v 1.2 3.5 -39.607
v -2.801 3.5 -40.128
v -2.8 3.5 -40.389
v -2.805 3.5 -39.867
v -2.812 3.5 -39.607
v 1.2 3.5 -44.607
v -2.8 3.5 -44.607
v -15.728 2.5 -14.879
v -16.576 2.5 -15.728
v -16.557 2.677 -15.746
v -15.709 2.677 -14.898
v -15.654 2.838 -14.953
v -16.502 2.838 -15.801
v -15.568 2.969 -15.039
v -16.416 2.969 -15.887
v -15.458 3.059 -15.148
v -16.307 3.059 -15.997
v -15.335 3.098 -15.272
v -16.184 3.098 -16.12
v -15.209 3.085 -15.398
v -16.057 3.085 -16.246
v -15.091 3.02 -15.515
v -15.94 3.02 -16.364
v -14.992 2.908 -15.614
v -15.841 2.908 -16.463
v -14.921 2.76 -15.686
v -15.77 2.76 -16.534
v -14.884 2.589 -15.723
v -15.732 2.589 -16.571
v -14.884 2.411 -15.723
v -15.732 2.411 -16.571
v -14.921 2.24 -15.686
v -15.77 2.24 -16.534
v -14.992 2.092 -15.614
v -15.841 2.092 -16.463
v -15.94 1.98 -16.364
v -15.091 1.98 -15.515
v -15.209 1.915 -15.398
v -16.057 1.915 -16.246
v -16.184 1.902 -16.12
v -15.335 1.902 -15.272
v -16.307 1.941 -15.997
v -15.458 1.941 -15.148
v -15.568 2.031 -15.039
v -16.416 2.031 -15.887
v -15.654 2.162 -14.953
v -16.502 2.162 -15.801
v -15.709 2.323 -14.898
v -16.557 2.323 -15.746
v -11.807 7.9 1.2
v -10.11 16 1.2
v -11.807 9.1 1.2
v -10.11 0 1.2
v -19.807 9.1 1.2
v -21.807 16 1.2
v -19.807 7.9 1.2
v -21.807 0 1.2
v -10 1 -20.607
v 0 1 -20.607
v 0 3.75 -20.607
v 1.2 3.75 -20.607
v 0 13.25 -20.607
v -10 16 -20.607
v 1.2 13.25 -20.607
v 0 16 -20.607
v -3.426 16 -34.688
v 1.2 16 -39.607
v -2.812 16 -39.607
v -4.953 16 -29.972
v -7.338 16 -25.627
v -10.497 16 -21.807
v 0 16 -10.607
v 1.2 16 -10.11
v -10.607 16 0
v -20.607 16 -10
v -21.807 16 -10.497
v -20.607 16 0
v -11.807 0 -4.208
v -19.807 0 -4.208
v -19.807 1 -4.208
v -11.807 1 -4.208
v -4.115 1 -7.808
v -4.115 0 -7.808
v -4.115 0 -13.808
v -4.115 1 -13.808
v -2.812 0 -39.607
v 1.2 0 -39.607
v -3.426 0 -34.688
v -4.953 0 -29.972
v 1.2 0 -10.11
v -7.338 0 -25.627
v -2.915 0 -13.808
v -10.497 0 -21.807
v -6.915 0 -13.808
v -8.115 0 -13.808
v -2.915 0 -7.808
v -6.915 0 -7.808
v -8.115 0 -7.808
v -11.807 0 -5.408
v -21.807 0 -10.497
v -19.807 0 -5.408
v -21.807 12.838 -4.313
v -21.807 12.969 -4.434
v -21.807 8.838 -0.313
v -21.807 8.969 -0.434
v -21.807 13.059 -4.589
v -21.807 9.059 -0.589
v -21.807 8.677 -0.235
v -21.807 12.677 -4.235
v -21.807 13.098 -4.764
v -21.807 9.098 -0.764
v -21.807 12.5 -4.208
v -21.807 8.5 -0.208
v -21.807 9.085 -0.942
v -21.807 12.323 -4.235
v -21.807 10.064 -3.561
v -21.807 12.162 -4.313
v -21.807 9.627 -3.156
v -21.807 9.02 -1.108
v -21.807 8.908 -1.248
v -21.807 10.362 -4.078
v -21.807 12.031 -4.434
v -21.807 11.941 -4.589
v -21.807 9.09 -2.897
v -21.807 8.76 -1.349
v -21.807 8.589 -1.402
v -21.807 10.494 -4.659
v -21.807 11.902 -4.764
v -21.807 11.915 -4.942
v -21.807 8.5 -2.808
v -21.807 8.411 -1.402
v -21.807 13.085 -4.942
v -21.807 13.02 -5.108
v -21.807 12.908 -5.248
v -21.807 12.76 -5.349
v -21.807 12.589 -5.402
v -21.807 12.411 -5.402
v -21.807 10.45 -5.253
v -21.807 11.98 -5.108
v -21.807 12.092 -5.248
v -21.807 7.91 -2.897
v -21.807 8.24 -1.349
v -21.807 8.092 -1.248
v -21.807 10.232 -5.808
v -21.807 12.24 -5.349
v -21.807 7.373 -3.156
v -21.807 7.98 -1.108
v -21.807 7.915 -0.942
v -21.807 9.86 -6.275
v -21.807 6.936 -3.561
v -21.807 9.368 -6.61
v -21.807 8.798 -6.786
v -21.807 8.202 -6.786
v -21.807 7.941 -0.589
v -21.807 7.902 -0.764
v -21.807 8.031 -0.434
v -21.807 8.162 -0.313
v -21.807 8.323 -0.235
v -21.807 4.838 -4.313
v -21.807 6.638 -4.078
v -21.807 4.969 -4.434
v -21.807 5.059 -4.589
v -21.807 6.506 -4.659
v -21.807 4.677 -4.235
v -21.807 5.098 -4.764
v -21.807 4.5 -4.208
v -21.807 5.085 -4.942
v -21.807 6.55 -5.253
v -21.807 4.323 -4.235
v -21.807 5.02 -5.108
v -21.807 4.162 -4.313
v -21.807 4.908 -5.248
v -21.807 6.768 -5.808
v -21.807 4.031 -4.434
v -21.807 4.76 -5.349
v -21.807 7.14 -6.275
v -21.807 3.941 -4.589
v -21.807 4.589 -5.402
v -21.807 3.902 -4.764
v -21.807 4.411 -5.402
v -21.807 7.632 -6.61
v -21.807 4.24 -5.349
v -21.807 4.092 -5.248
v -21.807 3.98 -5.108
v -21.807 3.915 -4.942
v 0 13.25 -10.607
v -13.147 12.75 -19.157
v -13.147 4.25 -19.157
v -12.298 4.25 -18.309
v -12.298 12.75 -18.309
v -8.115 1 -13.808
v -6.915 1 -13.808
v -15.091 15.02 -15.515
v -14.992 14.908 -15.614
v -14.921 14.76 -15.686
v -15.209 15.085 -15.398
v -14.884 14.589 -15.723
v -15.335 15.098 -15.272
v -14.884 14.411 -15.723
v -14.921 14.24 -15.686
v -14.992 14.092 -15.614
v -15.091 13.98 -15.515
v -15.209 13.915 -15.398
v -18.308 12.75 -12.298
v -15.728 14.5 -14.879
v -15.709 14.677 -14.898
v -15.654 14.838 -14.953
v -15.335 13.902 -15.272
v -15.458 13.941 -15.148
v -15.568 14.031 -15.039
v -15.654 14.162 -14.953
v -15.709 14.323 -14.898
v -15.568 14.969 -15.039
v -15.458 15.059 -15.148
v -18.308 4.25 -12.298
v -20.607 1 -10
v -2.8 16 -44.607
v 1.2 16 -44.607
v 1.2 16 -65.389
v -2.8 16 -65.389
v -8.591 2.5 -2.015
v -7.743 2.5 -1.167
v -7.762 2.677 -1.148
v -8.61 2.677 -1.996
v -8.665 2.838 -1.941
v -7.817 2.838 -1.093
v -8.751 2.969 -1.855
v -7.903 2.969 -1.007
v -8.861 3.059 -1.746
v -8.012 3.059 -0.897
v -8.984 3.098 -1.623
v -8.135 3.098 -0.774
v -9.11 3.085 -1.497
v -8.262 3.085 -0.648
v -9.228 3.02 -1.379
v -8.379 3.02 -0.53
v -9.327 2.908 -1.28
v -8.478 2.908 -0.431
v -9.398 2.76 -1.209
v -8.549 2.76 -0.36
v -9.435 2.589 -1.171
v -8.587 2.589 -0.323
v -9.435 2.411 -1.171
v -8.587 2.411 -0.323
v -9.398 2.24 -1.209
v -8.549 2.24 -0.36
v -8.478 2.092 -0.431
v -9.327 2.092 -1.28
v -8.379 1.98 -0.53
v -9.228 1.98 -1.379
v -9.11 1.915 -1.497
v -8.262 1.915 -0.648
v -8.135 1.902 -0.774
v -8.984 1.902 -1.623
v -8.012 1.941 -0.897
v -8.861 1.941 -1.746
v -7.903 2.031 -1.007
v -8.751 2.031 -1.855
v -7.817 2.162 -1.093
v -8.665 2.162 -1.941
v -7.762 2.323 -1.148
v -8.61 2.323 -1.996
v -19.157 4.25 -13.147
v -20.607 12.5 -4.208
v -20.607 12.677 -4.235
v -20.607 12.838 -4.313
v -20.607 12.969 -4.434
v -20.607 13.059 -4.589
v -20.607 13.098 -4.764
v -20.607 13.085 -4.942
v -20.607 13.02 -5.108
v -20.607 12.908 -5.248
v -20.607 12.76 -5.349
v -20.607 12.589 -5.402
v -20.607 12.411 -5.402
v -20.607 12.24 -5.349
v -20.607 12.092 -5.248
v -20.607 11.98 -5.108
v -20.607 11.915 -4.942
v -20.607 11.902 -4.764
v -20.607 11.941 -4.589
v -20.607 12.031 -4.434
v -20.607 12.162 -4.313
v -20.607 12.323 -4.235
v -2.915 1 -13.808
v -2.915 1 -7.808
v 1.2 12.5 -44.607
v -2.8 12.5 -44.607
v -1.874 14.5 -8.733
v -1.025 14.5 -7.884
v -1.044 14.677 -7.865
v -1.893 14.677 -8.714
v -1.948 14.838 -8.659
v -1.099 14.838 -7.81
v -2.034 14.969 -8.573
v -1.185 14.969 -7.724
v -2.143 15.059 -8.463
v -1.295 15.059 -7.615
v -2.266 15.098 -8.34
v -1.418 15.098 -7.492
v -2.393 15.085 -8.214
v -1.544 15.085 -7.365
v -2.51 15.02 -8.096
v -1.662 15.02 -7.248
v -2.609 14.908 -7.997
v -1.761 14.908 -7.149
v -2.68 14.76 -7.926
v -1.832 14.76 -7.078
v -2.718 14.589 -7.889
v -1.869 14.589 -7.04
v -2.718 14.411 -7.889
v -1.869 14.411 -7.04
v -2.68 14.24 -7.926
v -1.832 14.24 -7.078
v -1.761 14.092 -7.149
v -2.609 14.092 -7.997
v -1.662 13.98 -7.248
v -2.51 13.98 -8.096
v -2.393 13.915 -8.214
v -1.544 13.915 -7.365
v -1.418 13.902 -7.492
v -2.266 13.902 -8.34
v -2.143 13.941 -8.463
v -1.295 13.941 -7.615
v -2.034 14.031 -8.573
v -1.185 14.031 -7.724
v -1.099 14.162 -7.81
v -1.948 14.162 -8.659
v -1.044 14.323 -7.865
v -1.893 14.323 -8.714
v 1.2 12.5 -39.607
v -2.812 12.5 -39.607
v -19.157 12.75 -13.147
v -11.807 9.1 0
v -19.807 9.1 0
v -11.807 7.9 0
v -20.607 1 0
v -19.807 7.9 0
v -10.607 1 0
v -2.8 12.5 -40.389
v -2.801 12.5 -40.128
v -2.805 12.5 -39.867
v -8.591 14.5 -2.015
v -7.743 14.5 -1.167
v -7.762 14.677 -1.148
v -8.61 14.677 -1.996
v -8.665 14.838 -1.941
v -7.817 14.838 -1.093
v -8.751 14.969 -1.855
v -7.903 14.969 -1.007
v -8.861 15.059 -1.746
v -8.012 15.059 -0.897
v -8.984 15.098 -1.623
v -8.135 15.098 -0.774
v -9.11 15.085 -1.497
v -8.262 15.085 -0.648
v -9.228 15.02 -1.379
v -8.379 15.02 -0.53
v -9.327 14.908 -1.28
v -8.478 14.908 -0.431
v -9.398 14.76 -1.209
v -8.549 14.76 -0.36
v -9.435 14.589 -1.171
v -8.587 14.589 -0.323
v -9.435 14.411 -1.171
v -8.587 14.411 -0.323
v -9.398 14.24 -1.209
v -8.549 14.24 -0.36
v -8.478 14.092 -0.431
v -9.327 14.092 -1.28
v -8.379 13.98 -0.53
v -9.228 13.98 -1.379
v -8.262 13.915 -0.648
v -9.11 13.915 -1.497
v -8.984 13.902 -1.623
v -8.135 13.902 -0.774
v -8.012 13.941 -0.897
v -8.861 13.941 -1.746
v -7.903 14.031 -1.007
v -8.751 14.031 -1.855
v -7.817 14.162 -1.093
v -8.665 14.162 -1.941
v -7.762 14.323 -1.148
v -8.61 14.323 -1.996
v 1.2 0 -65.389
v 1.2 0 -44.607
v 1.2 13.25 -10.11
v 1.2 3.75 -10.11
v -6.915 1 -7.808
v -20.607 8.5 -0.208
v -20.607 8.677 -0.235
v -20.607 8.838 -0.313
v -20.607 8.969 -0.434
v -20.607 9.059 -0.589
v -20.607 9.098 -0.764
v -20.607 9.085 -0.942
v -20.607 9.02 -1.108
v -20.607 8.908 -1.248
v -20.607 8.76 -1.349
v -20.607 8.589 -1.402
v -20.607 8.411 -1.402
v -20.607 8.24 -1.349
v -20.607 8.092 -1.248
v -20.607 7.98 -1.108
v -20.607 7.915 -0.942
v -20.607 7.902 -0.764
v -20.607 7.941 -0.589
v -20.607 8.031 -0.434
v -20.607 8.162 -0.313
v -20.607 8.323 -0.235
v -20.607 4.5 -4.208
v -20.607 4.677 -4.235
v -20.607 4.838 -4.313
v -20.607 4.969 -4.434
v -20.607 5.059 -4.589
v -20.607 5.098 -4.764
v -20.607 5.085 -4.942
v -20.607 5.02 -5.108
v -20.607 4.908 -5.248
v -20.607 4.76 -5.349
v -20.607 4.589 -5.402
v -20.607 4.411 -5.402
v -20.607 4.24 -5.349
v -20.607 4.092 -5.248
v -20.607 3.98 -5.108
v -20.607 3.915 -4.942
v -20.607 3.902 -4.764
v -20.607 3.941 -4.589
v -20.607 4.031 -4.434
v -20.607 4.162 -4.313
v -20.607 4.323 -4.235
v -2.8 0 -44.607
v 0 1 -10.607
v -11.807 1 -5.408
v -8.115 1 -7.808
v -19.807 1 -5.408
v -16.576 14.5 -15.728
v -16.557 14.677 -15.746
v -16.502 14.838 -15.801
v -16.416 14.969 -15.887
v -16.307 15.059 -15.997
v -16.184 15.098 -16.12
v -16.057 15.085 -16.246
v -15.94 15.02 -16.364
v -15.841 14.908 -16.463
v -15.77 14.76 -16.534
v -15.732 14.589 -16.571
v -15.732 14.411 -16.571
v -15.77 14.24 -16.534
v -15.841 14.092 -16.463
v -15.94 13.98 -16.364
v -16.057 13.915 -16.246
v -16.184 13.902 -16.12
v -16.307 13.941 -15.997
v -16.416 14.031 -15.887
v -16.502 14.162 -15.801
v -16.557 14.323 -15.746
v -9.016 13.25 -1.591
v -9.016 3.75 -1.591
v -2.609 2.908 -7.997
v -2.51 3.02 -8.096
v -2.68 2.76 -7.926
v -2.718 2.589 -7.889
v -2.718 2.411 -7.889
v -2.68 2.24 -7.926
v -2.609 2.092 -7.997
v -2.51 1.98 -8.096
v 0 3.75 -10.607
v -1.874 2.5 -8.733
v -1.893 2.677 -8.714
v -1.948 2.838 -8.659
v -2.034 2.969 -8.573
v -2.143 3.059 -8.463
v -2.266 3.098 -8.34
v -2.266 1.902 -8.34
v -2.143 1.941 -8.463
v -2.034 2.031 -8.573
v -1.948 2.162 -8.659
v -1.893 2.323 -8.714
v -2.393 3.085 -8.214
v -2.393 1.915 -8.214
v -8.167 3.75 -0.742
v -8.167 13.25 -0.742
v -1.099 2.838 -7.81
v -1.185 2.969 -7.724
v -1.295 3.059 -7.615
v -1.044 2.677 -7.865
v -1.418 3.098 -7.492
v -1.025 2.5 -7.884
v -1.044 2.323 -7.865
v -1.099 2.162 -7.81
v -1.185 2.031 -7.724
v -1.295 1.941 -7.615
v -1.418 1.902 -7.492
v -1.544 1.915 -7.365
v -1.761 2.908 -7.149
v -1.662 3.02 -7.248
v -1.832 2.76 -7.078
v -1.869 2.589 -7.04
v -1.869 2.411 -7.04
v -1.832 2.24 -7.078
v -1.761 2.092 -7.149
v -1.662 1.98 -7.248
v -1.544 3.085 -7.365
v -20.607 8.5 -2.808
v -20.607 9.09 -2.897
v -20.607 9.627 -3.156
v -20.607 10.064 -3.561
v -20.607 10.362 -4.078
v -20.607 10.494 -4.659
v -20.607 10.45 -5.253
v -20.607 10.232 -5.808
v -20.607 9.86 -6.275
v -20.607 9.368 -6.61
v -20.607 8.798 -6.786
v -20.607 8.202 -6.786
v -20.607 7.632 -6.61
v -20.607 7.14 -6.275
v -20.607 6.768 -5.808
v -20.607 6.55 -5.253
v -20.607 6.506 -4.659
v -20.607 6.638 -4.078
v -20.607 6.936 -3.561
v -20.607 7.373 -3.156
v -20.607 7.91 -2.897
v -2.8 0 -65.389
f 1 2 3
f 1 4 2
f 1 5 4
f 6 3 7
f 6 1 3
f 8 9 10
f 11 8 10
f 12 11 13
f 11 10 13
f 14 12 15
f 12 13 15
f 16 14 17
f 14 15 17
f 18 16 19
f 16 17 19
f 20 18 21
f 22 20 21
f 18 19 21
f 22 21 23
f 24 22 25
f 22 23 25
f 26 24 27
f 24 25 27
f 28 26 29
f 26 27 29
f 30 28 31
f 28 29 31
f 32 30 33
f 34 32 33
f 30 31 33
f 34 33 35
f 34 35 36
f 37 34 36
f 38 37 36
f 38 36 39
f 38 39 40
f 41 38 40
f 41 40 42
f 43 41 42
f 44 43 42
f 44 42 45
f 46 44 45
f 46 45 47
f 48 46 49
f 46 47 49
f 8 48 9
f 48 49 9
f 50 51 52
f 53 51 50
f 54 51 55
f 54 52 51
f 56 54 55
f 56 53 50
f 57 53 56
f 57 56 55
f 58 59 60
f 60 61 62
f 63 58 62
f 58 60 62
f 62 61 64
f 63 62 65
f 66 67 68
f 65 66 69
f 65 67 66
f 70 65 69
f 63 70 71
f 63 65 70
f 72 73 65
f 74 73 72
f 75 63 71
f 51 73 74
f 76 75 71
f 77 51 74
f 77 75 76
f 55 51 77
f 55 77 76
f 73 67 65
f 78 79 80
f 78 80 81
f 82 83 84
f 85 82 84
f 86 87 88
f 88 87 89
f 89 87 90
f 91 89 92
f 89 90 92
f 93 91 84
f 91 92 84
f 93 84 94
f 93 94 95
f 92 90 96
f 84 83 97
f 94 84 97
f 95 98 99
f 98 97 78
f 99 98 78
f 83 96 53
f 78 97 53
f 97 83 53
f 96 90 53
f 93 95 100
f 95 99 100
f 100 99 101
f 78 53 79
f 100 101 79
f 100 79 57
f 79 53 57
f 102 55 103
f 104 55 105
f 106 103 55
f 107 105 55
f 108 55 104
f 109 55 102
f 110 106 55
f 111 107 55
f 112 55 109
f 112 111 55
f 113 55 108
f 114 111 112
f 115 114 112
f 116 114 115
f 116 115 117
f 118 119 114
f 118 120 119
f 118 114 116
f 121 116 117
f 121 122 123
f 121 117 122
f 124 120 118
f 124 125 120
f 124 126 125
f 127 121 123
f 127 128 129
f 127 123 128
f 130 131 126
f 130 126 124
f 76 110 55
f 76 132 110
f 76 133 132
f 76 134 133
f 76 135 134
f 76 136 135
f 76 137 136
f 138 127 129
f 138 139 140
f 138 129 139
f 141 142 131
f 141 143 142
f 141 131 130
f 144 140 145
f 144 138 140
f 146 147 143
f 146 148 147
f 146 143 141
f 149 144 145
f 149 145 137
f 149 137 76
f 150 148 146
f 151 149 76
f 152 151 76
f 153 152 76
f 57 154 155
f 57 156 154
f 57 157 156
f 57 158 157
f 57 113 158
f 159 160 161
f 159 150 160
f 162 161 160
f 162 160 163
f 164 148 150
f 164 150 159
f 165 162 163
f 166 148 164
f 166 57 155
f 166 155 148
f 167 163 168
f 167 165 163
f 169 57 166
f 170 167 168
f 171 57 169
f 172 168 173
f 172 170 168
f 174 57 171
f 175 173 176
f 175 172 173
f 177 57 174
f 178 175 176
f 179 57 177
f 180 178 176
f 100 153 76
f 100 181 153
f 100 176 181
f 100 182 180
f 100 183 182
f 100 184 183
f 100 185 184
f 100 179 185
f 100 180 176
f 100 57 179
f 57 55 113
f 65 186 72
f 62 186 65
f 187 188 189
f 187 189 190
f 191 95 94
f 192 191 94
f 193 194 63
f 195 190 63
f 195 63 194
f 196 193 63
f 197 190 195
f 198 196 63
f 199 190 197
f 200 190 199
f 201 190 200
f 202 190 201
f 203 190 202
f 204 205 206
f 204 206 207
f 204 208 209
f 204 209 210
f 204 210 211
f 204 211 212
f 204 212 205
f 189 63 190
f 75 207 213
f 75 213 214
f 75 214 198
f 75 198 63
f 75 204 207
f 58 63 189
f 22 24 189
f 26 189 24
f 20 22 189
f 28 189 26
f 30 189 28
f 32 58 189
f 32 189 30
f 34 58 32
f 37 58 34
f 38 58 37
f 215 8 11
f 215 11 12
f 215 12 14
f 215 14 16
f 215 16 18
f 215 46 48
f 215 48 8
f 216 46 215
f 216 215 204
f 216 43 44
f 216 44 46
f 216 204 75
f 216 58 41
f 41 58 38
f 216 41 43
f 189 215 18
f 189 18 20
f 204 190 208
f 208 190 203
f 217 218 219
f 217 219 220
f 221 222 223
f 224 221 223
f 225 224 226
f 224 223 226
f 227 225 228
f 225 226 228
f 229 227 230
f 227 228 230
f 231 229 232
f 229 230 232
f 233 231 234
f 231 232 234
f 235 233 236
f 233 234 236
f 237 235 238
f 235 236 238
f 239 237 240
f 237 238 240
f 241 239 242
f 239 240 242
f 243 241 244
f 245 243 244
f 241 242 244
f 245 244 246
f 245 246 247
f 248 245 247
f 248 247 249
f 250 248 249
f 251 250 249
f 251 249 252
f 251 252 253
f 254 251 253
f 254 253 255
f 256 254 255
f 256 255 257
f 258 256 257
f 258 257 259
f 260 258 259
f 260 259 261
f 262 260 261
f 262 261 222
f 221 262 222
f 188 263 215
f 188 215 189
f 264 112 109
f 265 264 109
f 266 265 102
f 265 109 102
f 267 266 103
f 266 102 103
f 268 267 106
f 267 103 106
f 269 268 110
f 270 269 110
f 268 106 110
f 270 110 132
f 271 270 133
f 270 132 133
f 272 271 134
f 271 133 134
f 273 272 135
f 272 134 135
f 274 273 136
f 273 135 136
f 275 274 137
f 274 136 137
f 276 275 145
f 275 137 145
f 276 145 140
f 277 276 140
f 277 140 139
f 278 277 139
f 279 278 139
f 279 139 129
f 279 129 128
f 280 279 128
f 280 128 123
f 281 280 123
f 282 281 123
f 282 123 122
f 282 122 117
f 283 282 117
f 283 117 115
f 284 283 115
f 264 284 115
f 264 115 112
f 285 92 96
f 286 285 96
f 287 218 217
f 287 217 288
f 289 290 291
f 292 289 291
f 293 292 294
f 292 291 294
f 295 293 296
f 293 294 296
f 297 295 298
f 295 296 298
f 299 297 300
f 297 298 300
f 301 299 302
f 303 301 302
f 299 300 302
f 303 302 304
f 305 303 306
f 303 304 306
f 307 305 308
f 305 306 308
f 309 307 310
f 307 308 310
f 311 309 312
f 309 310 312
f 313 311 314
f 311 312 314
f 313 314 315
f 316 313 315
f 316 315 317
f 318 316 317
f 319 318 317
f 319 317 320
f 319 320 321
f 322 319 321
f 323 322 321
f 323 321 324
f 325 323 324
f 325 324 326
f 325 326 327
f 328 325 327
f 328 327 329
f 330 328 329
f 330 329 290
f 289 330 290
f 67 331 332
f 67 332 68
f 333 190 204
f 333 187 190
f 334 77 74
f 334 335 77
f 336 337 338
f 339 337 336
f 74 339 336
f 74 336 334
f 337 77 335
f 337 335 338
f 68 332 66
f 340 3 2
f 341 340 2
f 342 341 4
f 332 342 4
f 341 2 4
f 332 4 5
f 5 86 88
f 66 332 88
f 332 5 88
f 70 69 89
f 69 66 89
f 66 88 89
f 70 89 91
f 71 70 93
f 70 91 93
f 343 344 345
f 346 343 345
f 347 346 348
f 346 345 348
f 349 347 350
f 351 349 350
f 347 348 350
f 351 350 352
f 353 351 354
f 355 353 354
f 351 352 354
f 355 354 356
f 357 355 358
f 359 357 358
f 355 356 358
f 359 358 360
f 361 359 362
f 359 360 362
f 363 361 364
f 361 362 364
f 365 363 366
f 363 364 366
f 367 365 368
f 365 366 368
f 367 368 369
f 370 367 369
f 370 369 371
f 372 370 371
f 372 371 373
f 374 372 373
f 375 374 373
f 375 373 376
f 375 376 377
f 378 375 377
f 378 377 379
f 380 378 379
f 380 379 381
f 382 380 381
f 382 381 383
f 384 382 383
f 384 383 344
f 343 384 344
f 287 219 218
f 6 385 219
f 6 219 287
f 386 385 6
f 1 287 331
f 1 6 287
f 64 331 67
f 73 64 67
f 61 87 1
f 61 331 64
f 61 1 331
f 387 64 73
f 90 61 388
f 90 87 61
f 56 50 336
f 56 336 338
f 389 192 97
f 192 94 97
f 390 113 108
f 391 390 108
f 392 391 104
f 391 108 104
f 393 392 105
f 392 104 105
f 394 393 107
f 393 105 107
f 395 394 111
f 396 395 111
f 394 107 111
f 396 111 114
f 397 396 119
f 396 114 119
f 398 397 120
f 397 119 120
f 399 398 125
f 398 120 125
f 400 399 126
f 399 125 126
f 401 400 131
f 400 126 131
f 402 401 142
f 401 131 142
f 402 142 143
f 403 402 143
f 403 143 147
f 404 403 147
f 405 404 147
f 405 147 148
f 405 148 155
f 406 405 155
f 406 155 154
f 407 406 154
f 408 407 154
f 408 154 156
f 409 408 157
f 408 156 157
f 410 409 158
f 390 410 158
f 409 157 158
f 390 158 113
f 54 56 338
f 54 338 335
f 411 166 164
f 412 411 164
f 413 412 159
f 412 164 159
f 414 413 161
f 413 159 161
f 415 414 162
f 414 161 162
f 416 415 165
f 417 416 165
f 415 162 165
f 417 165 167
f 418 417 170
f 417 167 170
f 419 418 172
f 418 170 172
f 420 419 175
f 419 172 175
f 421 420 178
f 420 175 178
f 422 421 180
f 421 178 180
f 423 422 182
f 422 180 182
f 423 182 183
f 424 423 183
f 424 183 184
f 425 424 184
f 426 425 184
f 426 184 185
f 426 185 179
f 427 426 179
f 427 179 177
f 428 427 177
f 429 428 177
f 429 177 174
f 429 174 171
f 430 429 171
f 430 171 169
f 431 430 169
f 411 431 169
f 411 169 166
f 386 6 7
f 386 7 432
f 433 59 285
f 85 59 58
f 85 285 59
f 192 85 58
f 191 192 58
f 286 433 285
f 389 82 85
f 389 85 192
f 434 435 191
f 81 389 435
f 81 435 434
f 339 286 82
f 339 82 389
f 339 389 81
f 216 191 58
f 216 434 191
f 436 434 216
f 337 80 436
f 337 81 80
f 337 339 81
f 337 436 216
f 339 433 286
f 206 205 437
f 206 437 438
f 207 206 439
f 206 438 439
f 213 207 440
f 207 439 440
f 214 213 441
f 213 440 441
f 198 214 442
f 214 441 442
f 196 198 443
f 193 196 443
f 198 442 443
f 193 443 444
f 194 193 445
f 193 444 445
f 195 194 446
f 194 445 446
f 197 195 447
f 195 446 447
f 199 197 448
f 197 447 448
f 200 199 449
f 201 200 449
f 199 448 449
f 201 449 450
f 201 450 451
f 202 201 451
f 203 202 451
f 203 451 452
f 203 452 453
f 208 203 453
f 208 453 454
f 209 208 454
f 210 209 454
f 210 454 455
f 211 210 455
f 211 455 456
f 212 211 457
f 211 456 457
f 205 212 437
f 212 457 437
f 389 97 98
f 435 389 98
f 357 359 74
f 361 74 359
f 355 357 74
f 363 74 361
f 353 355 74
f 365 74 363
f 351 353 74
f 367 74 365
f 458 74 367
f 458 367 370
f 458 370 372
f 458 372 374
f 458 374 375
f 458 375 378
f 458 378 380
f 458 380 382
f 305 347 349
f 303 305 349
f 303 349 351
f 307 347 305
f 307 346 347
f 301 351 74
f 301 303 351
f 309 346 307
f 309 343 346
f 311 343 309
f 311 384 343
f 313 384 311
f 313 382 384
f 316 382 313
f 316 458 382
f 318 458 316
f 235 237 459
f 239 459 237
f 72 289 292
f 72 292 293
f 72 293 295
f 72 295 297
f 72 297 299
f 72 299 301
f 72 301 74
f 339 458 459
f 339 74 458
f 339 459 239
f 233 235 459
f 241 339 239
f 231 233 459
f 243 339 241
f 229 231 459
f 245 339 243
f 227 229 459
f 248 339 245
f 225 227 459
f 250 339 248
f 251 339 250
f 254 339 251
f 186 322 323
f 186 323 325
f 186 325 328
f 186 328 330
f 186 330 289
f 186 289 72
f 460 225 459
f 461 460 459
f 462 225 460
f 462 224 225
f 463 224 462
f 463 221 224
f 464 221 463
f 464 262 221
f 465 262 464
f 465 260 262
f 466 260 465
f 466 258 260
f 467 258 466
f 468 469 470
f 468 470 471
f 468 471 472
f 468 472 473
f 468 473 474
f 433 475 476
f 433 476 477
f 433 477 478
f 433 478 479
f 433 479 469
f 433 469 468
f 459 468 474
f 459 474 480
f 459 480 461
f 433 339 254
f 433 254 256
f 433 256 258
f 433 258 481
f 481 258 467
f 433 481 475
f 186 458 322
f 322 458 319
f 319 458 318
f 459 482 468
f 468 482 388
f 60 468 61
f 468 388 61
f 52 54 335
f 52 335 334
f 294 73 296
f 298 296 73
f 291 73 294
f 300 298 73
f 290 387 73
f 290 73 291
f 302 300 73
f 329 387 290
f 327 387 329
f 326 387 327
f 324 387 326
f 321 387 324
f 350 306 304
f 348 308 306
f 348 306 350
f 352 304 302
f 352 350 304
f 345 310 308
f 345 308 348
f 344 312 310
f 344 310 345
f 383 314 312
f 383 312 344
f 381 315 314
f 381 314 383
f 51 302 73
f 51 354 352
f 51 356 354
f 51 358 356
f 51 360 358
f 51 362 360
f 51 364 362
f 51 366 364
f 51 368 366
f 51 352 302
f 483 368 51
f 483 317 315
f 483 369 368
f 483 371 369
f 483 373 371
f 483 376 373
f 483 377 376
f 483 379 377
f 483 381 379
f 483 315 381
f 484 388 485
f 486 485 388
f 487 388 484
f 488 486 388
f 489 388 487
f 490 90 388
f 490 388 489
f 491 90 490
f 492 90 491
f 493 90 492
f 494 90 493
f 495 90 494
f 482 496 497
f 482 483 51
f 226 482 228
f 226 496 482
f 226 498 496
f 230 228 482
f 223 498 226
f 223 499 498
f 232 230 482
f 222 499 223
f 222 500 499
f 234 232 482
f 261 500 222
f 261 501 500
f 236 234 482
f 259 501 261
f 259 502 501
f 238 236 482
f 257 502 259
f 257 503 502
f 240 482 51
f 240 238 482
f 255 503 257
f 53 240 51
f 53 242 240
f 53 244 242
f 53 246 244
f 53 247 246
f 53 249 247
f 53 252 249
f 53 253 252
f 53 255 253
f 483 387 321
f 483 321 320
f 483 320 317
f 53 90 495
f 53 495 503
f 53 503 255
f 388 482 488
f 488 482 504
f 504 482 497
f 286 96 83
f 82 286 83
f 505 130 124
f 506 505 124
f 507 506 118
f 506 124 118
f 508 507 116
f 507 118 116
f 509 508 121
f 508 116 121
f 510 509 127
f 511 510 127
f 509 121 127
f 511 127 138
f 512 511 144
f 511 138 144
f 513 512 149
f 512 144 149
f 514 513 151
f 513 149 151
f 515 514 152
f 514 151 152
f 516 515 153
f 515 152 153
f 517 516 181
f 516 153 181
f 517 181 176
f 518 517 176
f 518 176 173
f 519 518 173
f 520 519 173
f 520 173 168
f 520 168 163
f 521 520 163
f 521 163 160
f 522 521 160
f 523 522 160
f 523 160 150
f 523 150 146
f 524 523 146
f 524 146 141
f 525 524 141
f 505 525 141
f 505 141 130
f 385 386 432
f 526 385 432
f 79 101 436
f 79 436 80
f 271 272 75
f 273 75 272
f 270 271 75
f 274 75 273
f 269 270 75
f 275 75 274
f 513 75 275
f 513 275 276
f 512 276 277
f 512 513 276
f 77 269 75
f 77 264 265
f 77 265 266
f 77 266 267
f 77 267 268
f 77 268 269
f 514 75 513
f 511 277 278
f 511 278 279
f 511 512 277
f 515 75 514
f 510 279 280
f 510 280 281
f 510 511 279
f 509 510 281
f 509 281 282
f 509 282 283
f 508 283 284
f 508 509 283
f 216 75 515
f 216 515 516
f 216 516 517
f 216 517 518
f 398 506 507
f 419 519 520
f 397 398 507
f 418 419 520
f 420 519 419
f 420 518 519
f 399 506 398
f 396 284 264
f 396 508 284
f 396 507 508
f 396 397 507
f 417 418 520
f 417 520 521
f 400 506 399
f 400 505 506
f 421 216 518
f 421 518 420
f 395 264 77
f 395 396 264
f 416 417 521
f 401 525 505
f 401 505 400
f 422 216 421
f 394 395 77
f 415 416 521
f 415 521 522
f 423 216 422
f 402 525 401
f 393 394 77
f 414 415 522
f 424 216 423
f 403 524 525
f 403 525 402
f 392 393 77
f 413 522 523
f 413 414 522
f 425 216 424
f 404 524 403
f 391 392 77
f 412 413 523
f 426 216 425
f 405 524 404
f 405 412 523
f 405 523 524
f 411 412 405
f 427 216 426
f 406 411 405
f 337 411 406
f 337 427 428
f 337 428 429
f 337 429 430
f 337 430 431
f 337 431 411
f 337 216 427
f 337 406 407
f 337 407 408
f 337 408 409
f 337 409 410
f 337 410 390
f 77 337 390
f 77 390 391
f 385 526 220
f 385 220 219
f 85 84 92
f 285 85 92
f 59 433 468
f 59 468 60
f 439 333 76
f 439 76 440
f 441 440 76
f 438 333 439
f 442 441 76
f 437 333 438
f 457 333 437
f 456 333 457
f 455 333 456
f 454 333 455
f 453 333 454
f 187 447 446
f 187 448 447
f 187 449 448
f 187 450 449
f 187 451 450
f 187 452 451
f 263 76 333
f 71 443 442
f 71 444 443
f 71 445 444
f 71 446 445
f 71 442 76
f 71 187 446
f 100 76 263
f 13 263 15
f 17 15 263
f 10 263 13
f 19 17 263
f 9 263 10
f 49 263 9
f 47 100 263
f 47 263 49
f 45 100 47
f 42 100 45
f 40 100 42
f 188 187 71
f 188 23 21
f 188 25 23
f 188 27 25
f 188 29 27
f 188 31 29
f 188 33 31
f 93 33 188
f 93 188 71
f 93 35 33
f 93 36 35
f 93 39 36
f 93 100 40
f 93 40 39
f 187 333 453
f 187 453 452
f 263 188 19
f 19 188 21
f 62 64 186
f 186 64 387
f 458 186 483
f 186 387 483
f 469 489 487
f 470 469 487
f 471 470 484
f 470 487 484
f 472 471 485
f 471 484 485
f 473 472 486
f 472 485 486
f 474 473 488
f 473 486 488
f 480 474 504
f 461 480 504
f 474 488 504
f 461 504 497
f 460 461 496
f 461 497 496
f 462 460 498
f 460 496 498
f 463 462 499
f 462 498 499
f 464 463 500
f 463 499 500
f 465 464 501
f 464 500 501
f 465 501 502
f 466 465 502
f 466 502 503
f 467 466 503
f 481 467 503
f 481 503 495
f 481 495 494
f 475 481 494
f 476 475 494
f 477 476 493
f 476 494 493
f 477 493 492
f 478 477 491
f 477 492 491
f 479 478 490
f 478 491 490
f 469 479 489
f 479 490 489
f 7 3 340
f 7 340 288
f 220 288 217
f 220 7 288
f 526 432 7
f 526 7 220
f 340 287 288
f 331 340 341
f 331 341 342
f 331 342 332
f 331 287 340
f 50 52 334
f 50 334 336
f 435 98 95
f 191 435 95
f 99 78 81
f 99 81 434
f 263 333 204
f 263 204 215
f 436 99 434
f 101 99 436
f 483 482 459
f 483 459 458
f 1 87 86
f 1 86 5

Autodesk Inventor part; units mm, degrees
ref_plane "YZ Plane" through (0, 0, 0) normal (1, 0, 0) x (0, 1, 0)
ref_plane "XZ Plane" through (0, 0, 0) normal (0, 1, 0) x (-1, 0, 0)
ref_plane "XY Plane" through (0, 0, 0) normal (0, 0, 1) x (1, 0, 0)
sketch "Sketch1" plane through (0, 0, 0) normal (0, 1, 0) x (-1, 0, 0)
  line L0 (10.6066, 0) -> (0, -10.6066)
  line L1 (0, -10.6066) -> (0, -20.6066)
  line L2 (0, -20.6066) -> (10, -20.6066)
  line L3 (10, -20.6066) -> (20.6066, -10)
  line L4 (20.6066, -10) -> (20.6066, 0)
  line L5 (20.6066, 0) -> (10.6066, 0)
  line L6 (21.8066, 1.2) -> (21.8066, -10.4971)
  line L7 (21.8066, -10.4971) -> (10.4971, -21.8066)
  line L8 (10.4971, -21.8066) -> (-1.2, -21.8066)
  line L9 (-1.2, -21.8066) -> (-1.2, -10.1095)
  line L10 (-1.2, -10.1095) -> (10.1095, 1.2)
  line L11 (10.1095, 1.2) -> (21.8066, 1.2)
  line L12 (-1.2, -21.8066) -> (-1.2, -40.3889)
  line L13 (-1.2, -40.3889) -> (2.8, -40.3889)
  arc A0 (10.4971, -21.8066) -> (2.8, -40.3889) centre (29.0794, -40.3889) ccw
  line L14 (4.8083, -4.1012) -> (5.5154, -4.8083) construction
  line L15 (5.5154, -4.8083) -> (13.9559, -4.8083) construction
  line L16 (5.5154, -4.8083) -> (5.5154, -15.0259) construction
  line L17 (-1.2, -40.3889) -> (2.8, -40.3889)
  line L18 (2.8, -40.3889) -> (2.8, -65.3889)
  line L19 (2.8, -65.3889) -> (-1.2, -65.3889)
  line L20 (-1.2, -65.3889) -> (-1.2, -40.3889)
  point P0 (0, 0)
  point P1 (4.4548, -4.4548)
  dimension "d0" = 135
  dimension "d2" = 15
  dimension "d3" = 10
  dimension "d4" = 10
  dimension "d5" = 10
  dimension "d6" = 1.2
  dimension "d29" = 4
  dimension "d44" = 1
  dimension "d45" = 0.5
  dimension "d52" = 25
extrude "Extrusion1" add sketch "Sketch1" along normal blind 1 contours L5 L4 L3 L2 L1 L0
extrude "Extrusion2" add sketch "Sketch1" along normal blind 16
sketch "Sketch2" plane through (1.2, 0, -10.1095) normal (0.7071, 0, 0.7071) x (0.7071, 0, -0.7071)
  line L0 (-15.9941, 0) -> (0, 0) projected
  line L1 (0, 0) -> (0, 16) projected
  line L2 (-15.9941, 16) -> (0, 16) projected
  line L3 (-15.9941, 0) -> (-15.9941, 16) projected
  line L4 (-13.2471, 13.25) -> (-3.7471, 13.25)
  line L5 (-3.7471, 13.25) -> (-3.7471, 3.75)
  line L6 (-3.7471, 3.75) -> (-13.2471, 3.75)
  line L7 (-13.2471, 3.75) -> (-13.2471, 13.25)
  circle A0 centre (-13.2471, 14.5) radius 0.6
  circle A1 centre (-3.7471, 14.5) radius 0.6
  circle A2 centre (-3.7471, 2.5) radius 0.6
  circle A3 centre (-13.2471, 2.5) radius 0.6
  point P0 (-7.9971, 0)
  point P1 (-8.4971, 13.25)
  point P2 (-7.9971, 16)
  point P3 (-13.2471, 8.5)
  point P4 (-15.9941, 8)
  point P5 (-8.4971, 0)
  point P6 (-8.4971, 0)
  point P7 (-8.4971, 0)
  dimension "d11" = 0.5
  dimension "d12" = 9.5
  dimension "d13" = 6
  dimension "d14" = 6
  dimension "d15" = 1.2
extrude "Extrusion3" cut sketch "Sketch2" against normal blind 2 contours L4 L5 L6 L7 | A0 | A1 | A2 | A3
sketch "Sketch3" plane through (1.2, 0, -10.1095) normal (1, 0, 0) x (0, 0, -1)
  line L0 (-9.3671, 13.25) -> (-2.6496, 13.25) projected
  line L1 (-2.6496, 3.75) -> (-9.3671, 3.75) projected
  line L2 (-2.6496, 3.75) -> (10.4971, 3.75)
  line L3 (10.4971, 3.75) -> (10.4971, 13.25)
  line L4 (10.4971, 13.25) -> (-2.6496, 13.25)
  line L5 (-2.6496, 13.25) -> (-2.6496, 3.75)
  line L6 (10.4971, 1) -> (10.4971, 16) projected
  line L7 (0, 16) -> (55.2794, 16) projected
  line L8 (55.2794, 0) -> (55.2794, 16) projected
  line L9 (0, 0) -> (55.2794, 0) projected
  line L10 (34.4971, 0) -> (29.4971, 0)
  line L11 (29.4971, 0) -> (29.4971, 3.5)
  line L12 (29.4971, 3.5) -> (34.4971, 3.5)
  line L13 (34.4971, 3.5) -> (34.4971, 0)
  line L14 (29.4971, 16) -> (34.4971, 16)
  line L15 (34.4971, 16) -> (34.4971, 12.5)
  line L16 (34.4971, 12.5) -> (29.4971, 12.5)
  line L17 (29.4971, 12.5) -> (29.4971, 16)
  point P0 (-10.1095, 0)
  point P1 (55.2794, 8)
  dimension "d59" = 5
  dimension "d60" = 9
  dimension "d66" = 20.7823
extrude "Extrusion4" cut sketch "Sketch3" against normal up to next
sketch "Sketch4" plane through (-21.8066, 0, -10.4971) normal (-0.7071, 0, -0.7071) x (-0.7071, 0, 0.7071)
  line L0 (-15.9941, 0) -> (0, 0) projected
  line L1 (0, 0) -> (0, 16) projected
  line L2 (-15.9941, 16) -> (0, 16) projected
  line L3 (-15.9941, 0) -> (-15.9941, 16) projected
  line L4 (-12.2471, 12.75) -> (-3.7471, 12.75)
  line L5 (-3.7471, 12.75) -> (-3.7471, 4.25)
  line L6 (-3.7471, 4.25) -> (-12.2471, 4.25)
  line L7 (-12.2471, 4.25) -> (-12.2471, 12.75)
  circle A0 centre (-7.9971, 14.5) radius 0.6
  circle A1 centre (-7.9971, 2.5) radius 0.6
  point P0 (-7.9971, 0)
  point P1 (-7.9971, 12.75)
  point P2 (-7.9971, 16)
  point P3 (0, 8)
  point P4 (-3.7471, 8.5)
  point P5 (-12.2471, 8.5)
  dimension "d21" = 0.5
  dimension "d22" = 8.5
  dimension "d23" = 6
  dimension "d24" = 6
  dimension "d25" = 1.2
extrude "Extrusion5" cut sketch "Sketch4" against normal blind 2 contours L4 L5 L6 L7 | A0 | A1
sketch "Sketch5" plane through (-21.8066, 0, -10.4971) normal (-1, 0, 0) x (0, 0, 1)
  line L0 (10.4971, 1) -> (10.4971, 16) projected
  circle A0 centre (5.6887, 8.5) radius 2
  circle A1 centre (5.6887, 12.5) radius 0.6
  circle A2 centre (5.6887, 4.5) radius 0.6
  circle A3 centre (9.6887, 8.5) radius 0.6
  point P0 (10.4971, 0)
  point P1 (10.4971, 8.5)
  point P2 (5.6887, 0)
  point P3 (5.6887, 0)
  point P4 (5.6887, 0)
  dimension "d30" = 4
  dimension "d31" = 1.2
  dimension "d32" = 4
  dimension "d33" = 4
  dimension "d34" = 4
extrude "Extrusion6" cut sketch "Sketch5" against normal blind 2
sketch "Sketch6" plane through (0, 0, 0) normal (0, -1, 0) x (1, 0, 0)
  line L0 (-21.8066, -6.8083) -> (-21.8066, -2.8083) projected
  line L1 (-11.8066, -7.4083) -> (-19.8066, -7.4083)
  line L2 (-19.8066, -7.4083) -> (-19.8066, -6.2083)
  line L3 (-19.8066, -6.2083) -> (-11.8066, -6.2083)
  line L4 (-11.8066, -6.2083) -> (-11.8066, -7.4083)
  line L5 (-11.8066, -3.4083) -> (-19.8066, -3.4083)
  line L6 (-19.8066, -3.4083) -> (-19.8066, -2.2083)
  line L7 (-19.8066, -2.2083) -> (-11.8066, -2.2083)
  line L8 (-11.8066, -2.2083) -> (-11.8066, -3.4083)
  line L9 (-15.8066, -6.2083) -> (-15.8066, -3.4083) construction
  line L10 (-5.5154, -4.8083) -> (-13.9559, -4.8083) construction
  line L11 (-5.5154, -4.8083) -> (-5.5154, -15.0259) construction
  line L12 (-8.1154, -13.8083) -> (-6.9154, -13.8083)
  line L13 (-6.9154, -13.8083) -> (-6.9154, -7.8083)
  line L14 (-6.9154, -7.8083) -> (-8.1154, -7.8083)
  line L15 (-8.1154, -7.8083) -> (-8.1154, -13.8083)
  line L16 (-4.1154, -13.8083) -> (-2.9154, -13.8083)
  line L17 (-2.9154, -13.8083) -> (-2.9154, -7.8083)
  line L18 (-2.9154, -7.8083) -> (-4.1154, -7.8083)
  line L19 (-4.1154, -7.8083) -> (-4.1154, -13.8083)
  line L20 (-4.1154, -10.8083) -> (-6.9154, -10.8083) construction
  line L21 (-11.8066, -5.4083) -> (-19.8066, -5.4083)
  line L22 (-19.8066, -5.4083) -> (-19.8066, -4.2083)
  line L23 (-19.8066, -4.2083) -> (-11.8066, -4.2083)
  line L24 (-11.8066, -4.2083) -> (-11.8066, -5.4083)
  line L25 (-5.6154, -7.8083) -> (-5.4154, -7.8083)
  line L26 (-5.4154, -7.8083) -> (-5.4154, -13.8083)
  line L27 (-5.4154, -13.8083) -> (-5.6154, -13.8083)
  line L28 (-5.6154, -13.8083) -> (-5.6154, -7.8083)
  point P0 (0, 0)
  point P1 (-21.8066, -4.8083)
  point P2 (-19.8066, -2.8083)
  point P3 (-19.8066, -6.8083)
  point P4 (-15.8066, -7.4083)
  point P5 (-15.8066, -4.8083)
  point P6 (-5.5154, -10.8083)
  point P7 (-3.5154, -13.8083)
  point P8 (-7.5154, -13.8083)
  point P9 (-19.8066, -4.8083)
  point P10 (-5.5154, -7.8083)
  dimension "d38" = 1.2
  dimension "d39" = 4
  dimension "d40" = 8
  dimension "d41" = 6
  dimension "d46" = 1.2
  dimension "d47" = 6
  dimension "d48" = 4
  dimension "d49" = 3
  dimension "d51" = 1.3
  dimension "d62" = 1.2
extrude "Extrusion7" cut sketch "Sketch6" against normal blind 25.4 contours L15 L14 L13 L12 | L19 L18 L17 L16 | L21 L22 L23 L24
sketch "Sketch7" plane through (-21.8066, 0, 1.2) normal (0, 0, 1) x (1, 0, 0)
  line L0 (2, 0) -> (10, 0) projected
  line L1 (0, 6.5) -> (0, 10.5) projected
  line L2 (2, 9.1) -> (10, 9.1)
  line L3 (10, 9.1) -> (10, 7.9)
  line L4 (10, 7.9) -> (2, 7.9)
  line L5 (2, 7.9) -> (2, 9.1)
  point P0 (21.8066, 0)
  point P1 (2, 8.5)
  point P2 (0, 8.5)
  dimension "d63" = 1.2
extrude "Extrusion8" cut sketch "Sketch7" against normal up to next
properties part number "tactic2 chassis1"
